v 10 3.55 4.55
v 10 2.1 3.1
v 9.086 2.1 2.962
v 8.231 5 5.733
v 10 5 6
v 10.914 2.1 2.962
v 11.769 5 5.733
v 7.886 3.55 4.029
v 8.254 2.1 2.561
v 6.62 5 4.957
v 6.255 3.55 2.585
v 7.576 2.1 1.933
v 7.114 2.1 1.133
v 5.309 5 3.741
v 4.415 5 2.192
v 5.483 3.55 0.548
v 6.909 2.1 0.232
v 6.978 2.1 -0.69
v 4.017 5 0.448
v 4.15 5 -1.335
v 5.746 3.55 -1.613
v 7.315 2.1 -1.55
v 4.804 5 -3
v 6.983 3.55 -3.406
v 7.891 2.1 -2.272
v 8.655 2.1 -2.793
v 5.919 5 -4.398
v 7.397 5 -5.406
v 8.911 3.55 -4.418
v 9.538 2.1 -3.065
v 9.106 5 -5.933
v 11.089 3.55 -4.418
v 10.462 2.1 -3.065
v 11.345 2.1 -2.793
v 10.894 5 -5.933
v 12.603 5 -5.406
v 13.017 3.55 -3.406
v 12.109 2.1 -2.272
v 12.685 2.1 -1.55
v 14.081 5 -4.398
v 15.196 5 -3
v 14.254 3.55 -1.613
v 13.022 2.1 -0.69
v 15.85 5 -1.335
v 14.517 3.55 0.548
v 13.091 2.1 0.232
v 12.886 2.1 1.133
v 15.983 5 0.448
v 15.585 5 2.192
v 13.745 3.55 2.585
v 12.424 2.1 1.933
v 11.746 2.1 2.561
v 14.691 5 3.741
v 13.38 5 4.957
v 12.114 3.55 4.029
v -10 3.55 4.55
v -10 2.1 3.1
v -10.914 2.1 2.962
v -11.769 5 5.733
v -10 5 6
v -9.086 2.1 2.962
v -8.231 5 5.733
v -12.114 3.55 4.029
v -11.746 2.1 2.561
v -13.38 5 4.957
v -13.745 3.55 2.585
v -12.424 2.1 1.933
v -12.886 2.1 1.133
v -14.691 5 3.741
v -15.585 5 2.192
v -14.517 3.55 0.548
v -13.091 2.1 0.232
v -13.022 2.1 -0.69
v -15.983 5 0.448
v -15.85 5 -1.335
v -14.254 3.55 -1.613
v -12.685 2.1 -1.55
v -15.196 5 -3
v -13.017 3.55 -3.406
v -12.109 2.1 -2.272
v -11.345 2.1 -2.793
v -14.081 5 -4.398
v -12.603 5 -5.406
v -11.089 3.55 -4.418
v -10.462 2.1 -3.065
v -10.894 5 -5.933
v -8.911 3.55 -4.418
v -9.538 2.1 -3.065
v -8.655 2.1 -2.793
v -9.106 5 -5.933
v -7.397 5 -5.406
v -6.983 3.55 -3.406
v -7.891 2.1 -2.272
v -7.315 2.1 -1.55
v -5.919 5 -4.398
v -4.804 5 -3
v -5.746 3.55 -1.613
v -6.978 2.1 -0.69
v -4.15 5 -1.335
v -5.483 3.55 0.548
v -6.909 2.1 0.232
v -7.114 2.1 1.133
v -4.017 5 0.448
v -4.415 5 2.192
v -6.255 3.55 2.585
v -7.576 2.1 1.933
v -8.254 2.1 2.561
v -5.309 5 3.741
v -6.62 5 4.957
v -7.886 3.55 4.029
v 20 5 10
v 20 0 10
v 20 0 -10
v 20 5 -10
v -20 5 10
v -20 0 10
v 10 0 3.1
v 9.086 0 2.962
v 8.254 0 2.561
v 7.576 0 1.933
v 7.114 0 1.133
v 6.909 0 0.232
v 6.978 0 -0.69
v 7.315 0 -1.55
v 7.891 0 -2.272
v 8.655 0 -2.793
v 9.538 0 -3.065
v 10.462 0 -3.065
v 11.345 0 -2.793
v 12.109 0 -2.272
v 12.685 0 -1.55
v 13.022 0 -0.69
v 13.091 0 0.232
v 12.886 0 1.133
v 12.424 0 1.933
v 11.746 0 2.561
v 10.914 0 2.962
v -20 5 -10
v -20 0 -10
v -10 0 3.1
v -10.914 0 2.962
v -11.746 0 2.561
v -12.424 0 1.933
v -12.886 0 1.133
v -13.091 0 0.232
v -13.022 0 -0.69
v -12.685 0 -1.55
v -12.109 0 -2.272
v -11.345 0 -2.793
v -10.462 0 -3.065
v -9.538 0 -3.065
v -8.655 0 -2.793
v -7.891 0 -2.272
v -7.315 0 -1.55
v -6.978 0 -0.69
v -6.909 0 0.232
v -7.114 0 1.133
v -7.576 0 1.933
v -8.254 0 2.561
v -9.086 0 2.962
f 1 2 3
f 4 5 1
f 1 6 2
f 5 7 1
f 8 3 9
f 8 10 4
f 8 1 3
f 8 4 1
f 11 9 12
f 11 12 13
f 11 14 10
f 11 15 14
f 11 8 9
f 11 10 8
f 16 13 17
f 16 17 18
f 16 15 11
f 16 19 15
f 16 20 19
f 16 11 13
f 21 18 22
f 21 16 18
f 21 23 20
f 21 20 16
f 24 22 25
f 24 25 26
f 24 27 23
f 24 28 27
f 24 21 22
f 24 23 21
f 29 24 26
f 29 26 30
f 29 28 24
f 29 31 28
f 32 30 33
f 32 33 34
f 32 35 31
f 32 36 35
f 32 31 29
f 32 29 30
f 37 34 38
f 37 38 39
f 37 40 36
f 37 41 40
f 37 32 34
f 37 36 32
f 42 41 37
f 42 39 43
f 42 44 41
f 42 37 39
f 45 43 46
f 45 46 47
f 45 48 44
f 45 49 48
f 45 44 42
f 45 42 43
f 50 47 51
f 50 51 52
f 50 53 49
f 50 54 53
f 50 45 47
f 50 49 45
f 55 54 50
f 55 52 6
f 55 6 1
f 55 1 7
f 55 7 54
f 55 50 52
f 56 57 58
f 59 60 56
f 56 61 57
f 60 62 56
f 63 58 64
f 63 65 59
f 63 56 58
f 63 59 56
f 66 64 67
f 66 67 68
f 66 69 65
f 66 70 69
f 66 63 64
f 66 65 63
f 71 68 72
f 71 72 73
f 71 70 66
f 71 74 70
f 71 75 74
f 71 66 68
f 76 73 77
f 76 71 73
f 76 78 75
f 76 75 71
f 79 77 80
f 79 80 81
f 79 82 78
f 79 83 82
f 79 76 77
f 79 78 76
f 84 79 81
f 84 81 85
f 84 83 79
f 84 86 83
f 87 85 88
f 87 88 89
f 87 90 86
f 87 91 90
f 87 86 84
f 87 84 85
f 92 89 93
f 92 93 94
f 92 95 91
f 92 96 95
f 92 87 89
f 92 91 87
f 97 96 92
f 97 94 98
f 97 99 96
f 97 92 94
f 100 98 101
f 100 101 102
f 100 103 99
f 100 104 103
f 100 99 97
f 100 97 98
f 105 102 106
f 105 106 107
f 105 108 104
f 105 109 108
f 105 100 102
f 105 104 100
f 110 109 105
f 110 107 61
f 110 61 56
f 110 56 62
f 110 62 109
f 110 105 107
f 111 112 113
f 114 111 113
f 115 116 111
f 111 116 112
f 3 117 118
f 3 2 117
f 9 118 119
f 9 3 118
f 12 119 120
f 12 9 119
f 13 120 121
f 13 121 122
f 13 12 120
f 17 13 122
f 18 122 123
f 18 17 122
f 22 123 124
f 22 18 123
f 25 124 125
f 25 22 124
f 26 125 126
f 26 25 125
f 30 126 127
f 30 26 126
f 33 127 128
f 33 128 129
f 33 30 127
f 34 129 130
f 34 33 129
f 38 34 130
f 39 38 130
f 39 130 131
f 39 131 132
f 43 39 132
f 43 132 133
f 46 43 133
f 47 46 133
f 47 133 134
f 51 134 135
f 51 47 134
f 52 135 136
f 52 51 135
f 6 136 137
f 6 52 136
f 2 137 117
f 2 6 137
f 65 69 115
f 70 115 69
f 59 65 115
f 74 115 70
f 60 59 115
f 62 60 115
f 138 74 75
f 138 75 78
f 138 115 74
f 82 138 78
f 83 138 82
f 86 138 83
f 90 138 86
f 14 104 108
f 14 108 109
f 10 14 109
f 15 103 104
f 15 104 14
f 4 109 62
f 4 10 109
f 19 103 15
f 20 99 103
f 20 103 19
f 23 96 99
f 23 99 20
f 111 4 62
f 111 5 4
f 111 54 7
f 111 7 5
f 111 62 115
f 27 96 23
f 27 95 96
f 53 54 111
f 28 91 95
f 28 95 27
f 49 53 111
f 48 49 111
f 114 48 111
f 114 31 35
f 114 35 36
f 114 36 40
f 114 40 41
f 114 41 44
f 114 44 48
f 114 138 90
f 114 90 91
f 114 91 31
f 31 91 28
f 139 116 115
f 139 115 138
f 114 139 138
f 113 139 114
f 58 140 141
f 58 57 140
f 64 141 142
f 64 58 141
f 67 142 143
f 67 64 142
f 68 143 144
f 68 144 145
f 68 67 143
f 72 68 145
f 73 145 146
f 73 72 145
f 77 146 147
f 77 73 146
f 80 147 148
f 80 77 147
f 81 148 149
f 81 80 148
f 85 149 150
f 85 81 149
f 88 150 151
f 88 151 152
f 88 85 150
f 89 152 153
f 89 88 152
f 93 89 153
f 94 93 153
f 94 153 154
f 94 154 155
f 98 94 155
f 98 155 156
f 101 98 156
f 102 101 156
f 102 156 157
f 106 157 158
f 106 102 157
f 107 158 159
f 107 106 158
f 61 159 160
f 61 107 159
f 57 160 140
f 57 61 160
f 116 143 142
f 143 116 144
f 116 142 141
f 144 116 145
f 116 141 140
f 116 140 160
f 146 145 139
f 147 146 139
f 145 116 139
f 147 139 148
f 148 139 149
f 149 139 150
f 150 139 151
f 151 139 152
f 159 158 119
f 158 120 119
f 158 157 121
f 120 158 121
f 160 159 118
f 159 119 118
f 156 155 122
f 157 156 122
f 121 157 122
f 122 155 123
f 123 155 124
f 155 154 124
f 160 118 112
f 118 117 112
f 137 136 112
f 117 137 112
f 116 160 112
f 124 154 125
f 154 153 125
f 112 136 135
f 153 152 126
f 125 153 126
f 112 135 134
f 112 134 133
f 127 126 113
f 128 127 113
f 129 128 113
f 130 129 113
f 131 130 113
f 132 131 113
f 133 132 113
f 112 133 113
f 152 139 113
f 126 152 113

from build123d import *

# Parameters (mm, degrees)
SKETCH_1_W               = 40
SKETCH_1_H               = 20
EXTRUDE_1_DEPTH          = 5
HOLE_WIZARD_1_AT_2_COUNT = 2
HOLE_WIZARD_1_AT_2_PITCH = 20


with BuildPart() as part:
    # 草图1 → 凸台-拉伸1 (new body)
    with BuildSketch(Plane(origin=(0, 0, 0), x_dir=(1, 0, 0), z_dir=(0, 1, 0))):
        Rectangle(SKETCH_1_W, SKETCH_1_H)
    extrude(amount=EXTRUDE_1_DEPTH)

    # 草图3 → 打孔尺寸(%根据)内六角花形半沉头螺钉的类型1 (revolve, cut)
    with BuildSketch(Plane(origin=(-10, 5, 0), x_dir=(0, 0, 1), z_dir=(1, 0, 0))):
        Polygon((0, 0), (0, 5), (3.1, 5), (3.1, 2.9), (6, 0), align=None)
    hole_wizard_1 = revolve(axis=Axis((-10, 11.35, 0), (0, -1, 0)), mode=Mode.SUBTRACT)

    # 打孔尺寸(%根据)内六角花形半沉头螺钉的类型1 at 2: 打孔尺寸(%根据)内六角花形半沉头螺钉的类型1 ×2
    with Locations(*[(i * HOLE_WIZARD_1_AT_2_PITCH, 0, 0) for i in range(1, HOLE_WIZARD_1_AT_2_COUNT)]):
        add(hole_wizard_1, mode=Mode.SUBTRACT)


solid = part.part
